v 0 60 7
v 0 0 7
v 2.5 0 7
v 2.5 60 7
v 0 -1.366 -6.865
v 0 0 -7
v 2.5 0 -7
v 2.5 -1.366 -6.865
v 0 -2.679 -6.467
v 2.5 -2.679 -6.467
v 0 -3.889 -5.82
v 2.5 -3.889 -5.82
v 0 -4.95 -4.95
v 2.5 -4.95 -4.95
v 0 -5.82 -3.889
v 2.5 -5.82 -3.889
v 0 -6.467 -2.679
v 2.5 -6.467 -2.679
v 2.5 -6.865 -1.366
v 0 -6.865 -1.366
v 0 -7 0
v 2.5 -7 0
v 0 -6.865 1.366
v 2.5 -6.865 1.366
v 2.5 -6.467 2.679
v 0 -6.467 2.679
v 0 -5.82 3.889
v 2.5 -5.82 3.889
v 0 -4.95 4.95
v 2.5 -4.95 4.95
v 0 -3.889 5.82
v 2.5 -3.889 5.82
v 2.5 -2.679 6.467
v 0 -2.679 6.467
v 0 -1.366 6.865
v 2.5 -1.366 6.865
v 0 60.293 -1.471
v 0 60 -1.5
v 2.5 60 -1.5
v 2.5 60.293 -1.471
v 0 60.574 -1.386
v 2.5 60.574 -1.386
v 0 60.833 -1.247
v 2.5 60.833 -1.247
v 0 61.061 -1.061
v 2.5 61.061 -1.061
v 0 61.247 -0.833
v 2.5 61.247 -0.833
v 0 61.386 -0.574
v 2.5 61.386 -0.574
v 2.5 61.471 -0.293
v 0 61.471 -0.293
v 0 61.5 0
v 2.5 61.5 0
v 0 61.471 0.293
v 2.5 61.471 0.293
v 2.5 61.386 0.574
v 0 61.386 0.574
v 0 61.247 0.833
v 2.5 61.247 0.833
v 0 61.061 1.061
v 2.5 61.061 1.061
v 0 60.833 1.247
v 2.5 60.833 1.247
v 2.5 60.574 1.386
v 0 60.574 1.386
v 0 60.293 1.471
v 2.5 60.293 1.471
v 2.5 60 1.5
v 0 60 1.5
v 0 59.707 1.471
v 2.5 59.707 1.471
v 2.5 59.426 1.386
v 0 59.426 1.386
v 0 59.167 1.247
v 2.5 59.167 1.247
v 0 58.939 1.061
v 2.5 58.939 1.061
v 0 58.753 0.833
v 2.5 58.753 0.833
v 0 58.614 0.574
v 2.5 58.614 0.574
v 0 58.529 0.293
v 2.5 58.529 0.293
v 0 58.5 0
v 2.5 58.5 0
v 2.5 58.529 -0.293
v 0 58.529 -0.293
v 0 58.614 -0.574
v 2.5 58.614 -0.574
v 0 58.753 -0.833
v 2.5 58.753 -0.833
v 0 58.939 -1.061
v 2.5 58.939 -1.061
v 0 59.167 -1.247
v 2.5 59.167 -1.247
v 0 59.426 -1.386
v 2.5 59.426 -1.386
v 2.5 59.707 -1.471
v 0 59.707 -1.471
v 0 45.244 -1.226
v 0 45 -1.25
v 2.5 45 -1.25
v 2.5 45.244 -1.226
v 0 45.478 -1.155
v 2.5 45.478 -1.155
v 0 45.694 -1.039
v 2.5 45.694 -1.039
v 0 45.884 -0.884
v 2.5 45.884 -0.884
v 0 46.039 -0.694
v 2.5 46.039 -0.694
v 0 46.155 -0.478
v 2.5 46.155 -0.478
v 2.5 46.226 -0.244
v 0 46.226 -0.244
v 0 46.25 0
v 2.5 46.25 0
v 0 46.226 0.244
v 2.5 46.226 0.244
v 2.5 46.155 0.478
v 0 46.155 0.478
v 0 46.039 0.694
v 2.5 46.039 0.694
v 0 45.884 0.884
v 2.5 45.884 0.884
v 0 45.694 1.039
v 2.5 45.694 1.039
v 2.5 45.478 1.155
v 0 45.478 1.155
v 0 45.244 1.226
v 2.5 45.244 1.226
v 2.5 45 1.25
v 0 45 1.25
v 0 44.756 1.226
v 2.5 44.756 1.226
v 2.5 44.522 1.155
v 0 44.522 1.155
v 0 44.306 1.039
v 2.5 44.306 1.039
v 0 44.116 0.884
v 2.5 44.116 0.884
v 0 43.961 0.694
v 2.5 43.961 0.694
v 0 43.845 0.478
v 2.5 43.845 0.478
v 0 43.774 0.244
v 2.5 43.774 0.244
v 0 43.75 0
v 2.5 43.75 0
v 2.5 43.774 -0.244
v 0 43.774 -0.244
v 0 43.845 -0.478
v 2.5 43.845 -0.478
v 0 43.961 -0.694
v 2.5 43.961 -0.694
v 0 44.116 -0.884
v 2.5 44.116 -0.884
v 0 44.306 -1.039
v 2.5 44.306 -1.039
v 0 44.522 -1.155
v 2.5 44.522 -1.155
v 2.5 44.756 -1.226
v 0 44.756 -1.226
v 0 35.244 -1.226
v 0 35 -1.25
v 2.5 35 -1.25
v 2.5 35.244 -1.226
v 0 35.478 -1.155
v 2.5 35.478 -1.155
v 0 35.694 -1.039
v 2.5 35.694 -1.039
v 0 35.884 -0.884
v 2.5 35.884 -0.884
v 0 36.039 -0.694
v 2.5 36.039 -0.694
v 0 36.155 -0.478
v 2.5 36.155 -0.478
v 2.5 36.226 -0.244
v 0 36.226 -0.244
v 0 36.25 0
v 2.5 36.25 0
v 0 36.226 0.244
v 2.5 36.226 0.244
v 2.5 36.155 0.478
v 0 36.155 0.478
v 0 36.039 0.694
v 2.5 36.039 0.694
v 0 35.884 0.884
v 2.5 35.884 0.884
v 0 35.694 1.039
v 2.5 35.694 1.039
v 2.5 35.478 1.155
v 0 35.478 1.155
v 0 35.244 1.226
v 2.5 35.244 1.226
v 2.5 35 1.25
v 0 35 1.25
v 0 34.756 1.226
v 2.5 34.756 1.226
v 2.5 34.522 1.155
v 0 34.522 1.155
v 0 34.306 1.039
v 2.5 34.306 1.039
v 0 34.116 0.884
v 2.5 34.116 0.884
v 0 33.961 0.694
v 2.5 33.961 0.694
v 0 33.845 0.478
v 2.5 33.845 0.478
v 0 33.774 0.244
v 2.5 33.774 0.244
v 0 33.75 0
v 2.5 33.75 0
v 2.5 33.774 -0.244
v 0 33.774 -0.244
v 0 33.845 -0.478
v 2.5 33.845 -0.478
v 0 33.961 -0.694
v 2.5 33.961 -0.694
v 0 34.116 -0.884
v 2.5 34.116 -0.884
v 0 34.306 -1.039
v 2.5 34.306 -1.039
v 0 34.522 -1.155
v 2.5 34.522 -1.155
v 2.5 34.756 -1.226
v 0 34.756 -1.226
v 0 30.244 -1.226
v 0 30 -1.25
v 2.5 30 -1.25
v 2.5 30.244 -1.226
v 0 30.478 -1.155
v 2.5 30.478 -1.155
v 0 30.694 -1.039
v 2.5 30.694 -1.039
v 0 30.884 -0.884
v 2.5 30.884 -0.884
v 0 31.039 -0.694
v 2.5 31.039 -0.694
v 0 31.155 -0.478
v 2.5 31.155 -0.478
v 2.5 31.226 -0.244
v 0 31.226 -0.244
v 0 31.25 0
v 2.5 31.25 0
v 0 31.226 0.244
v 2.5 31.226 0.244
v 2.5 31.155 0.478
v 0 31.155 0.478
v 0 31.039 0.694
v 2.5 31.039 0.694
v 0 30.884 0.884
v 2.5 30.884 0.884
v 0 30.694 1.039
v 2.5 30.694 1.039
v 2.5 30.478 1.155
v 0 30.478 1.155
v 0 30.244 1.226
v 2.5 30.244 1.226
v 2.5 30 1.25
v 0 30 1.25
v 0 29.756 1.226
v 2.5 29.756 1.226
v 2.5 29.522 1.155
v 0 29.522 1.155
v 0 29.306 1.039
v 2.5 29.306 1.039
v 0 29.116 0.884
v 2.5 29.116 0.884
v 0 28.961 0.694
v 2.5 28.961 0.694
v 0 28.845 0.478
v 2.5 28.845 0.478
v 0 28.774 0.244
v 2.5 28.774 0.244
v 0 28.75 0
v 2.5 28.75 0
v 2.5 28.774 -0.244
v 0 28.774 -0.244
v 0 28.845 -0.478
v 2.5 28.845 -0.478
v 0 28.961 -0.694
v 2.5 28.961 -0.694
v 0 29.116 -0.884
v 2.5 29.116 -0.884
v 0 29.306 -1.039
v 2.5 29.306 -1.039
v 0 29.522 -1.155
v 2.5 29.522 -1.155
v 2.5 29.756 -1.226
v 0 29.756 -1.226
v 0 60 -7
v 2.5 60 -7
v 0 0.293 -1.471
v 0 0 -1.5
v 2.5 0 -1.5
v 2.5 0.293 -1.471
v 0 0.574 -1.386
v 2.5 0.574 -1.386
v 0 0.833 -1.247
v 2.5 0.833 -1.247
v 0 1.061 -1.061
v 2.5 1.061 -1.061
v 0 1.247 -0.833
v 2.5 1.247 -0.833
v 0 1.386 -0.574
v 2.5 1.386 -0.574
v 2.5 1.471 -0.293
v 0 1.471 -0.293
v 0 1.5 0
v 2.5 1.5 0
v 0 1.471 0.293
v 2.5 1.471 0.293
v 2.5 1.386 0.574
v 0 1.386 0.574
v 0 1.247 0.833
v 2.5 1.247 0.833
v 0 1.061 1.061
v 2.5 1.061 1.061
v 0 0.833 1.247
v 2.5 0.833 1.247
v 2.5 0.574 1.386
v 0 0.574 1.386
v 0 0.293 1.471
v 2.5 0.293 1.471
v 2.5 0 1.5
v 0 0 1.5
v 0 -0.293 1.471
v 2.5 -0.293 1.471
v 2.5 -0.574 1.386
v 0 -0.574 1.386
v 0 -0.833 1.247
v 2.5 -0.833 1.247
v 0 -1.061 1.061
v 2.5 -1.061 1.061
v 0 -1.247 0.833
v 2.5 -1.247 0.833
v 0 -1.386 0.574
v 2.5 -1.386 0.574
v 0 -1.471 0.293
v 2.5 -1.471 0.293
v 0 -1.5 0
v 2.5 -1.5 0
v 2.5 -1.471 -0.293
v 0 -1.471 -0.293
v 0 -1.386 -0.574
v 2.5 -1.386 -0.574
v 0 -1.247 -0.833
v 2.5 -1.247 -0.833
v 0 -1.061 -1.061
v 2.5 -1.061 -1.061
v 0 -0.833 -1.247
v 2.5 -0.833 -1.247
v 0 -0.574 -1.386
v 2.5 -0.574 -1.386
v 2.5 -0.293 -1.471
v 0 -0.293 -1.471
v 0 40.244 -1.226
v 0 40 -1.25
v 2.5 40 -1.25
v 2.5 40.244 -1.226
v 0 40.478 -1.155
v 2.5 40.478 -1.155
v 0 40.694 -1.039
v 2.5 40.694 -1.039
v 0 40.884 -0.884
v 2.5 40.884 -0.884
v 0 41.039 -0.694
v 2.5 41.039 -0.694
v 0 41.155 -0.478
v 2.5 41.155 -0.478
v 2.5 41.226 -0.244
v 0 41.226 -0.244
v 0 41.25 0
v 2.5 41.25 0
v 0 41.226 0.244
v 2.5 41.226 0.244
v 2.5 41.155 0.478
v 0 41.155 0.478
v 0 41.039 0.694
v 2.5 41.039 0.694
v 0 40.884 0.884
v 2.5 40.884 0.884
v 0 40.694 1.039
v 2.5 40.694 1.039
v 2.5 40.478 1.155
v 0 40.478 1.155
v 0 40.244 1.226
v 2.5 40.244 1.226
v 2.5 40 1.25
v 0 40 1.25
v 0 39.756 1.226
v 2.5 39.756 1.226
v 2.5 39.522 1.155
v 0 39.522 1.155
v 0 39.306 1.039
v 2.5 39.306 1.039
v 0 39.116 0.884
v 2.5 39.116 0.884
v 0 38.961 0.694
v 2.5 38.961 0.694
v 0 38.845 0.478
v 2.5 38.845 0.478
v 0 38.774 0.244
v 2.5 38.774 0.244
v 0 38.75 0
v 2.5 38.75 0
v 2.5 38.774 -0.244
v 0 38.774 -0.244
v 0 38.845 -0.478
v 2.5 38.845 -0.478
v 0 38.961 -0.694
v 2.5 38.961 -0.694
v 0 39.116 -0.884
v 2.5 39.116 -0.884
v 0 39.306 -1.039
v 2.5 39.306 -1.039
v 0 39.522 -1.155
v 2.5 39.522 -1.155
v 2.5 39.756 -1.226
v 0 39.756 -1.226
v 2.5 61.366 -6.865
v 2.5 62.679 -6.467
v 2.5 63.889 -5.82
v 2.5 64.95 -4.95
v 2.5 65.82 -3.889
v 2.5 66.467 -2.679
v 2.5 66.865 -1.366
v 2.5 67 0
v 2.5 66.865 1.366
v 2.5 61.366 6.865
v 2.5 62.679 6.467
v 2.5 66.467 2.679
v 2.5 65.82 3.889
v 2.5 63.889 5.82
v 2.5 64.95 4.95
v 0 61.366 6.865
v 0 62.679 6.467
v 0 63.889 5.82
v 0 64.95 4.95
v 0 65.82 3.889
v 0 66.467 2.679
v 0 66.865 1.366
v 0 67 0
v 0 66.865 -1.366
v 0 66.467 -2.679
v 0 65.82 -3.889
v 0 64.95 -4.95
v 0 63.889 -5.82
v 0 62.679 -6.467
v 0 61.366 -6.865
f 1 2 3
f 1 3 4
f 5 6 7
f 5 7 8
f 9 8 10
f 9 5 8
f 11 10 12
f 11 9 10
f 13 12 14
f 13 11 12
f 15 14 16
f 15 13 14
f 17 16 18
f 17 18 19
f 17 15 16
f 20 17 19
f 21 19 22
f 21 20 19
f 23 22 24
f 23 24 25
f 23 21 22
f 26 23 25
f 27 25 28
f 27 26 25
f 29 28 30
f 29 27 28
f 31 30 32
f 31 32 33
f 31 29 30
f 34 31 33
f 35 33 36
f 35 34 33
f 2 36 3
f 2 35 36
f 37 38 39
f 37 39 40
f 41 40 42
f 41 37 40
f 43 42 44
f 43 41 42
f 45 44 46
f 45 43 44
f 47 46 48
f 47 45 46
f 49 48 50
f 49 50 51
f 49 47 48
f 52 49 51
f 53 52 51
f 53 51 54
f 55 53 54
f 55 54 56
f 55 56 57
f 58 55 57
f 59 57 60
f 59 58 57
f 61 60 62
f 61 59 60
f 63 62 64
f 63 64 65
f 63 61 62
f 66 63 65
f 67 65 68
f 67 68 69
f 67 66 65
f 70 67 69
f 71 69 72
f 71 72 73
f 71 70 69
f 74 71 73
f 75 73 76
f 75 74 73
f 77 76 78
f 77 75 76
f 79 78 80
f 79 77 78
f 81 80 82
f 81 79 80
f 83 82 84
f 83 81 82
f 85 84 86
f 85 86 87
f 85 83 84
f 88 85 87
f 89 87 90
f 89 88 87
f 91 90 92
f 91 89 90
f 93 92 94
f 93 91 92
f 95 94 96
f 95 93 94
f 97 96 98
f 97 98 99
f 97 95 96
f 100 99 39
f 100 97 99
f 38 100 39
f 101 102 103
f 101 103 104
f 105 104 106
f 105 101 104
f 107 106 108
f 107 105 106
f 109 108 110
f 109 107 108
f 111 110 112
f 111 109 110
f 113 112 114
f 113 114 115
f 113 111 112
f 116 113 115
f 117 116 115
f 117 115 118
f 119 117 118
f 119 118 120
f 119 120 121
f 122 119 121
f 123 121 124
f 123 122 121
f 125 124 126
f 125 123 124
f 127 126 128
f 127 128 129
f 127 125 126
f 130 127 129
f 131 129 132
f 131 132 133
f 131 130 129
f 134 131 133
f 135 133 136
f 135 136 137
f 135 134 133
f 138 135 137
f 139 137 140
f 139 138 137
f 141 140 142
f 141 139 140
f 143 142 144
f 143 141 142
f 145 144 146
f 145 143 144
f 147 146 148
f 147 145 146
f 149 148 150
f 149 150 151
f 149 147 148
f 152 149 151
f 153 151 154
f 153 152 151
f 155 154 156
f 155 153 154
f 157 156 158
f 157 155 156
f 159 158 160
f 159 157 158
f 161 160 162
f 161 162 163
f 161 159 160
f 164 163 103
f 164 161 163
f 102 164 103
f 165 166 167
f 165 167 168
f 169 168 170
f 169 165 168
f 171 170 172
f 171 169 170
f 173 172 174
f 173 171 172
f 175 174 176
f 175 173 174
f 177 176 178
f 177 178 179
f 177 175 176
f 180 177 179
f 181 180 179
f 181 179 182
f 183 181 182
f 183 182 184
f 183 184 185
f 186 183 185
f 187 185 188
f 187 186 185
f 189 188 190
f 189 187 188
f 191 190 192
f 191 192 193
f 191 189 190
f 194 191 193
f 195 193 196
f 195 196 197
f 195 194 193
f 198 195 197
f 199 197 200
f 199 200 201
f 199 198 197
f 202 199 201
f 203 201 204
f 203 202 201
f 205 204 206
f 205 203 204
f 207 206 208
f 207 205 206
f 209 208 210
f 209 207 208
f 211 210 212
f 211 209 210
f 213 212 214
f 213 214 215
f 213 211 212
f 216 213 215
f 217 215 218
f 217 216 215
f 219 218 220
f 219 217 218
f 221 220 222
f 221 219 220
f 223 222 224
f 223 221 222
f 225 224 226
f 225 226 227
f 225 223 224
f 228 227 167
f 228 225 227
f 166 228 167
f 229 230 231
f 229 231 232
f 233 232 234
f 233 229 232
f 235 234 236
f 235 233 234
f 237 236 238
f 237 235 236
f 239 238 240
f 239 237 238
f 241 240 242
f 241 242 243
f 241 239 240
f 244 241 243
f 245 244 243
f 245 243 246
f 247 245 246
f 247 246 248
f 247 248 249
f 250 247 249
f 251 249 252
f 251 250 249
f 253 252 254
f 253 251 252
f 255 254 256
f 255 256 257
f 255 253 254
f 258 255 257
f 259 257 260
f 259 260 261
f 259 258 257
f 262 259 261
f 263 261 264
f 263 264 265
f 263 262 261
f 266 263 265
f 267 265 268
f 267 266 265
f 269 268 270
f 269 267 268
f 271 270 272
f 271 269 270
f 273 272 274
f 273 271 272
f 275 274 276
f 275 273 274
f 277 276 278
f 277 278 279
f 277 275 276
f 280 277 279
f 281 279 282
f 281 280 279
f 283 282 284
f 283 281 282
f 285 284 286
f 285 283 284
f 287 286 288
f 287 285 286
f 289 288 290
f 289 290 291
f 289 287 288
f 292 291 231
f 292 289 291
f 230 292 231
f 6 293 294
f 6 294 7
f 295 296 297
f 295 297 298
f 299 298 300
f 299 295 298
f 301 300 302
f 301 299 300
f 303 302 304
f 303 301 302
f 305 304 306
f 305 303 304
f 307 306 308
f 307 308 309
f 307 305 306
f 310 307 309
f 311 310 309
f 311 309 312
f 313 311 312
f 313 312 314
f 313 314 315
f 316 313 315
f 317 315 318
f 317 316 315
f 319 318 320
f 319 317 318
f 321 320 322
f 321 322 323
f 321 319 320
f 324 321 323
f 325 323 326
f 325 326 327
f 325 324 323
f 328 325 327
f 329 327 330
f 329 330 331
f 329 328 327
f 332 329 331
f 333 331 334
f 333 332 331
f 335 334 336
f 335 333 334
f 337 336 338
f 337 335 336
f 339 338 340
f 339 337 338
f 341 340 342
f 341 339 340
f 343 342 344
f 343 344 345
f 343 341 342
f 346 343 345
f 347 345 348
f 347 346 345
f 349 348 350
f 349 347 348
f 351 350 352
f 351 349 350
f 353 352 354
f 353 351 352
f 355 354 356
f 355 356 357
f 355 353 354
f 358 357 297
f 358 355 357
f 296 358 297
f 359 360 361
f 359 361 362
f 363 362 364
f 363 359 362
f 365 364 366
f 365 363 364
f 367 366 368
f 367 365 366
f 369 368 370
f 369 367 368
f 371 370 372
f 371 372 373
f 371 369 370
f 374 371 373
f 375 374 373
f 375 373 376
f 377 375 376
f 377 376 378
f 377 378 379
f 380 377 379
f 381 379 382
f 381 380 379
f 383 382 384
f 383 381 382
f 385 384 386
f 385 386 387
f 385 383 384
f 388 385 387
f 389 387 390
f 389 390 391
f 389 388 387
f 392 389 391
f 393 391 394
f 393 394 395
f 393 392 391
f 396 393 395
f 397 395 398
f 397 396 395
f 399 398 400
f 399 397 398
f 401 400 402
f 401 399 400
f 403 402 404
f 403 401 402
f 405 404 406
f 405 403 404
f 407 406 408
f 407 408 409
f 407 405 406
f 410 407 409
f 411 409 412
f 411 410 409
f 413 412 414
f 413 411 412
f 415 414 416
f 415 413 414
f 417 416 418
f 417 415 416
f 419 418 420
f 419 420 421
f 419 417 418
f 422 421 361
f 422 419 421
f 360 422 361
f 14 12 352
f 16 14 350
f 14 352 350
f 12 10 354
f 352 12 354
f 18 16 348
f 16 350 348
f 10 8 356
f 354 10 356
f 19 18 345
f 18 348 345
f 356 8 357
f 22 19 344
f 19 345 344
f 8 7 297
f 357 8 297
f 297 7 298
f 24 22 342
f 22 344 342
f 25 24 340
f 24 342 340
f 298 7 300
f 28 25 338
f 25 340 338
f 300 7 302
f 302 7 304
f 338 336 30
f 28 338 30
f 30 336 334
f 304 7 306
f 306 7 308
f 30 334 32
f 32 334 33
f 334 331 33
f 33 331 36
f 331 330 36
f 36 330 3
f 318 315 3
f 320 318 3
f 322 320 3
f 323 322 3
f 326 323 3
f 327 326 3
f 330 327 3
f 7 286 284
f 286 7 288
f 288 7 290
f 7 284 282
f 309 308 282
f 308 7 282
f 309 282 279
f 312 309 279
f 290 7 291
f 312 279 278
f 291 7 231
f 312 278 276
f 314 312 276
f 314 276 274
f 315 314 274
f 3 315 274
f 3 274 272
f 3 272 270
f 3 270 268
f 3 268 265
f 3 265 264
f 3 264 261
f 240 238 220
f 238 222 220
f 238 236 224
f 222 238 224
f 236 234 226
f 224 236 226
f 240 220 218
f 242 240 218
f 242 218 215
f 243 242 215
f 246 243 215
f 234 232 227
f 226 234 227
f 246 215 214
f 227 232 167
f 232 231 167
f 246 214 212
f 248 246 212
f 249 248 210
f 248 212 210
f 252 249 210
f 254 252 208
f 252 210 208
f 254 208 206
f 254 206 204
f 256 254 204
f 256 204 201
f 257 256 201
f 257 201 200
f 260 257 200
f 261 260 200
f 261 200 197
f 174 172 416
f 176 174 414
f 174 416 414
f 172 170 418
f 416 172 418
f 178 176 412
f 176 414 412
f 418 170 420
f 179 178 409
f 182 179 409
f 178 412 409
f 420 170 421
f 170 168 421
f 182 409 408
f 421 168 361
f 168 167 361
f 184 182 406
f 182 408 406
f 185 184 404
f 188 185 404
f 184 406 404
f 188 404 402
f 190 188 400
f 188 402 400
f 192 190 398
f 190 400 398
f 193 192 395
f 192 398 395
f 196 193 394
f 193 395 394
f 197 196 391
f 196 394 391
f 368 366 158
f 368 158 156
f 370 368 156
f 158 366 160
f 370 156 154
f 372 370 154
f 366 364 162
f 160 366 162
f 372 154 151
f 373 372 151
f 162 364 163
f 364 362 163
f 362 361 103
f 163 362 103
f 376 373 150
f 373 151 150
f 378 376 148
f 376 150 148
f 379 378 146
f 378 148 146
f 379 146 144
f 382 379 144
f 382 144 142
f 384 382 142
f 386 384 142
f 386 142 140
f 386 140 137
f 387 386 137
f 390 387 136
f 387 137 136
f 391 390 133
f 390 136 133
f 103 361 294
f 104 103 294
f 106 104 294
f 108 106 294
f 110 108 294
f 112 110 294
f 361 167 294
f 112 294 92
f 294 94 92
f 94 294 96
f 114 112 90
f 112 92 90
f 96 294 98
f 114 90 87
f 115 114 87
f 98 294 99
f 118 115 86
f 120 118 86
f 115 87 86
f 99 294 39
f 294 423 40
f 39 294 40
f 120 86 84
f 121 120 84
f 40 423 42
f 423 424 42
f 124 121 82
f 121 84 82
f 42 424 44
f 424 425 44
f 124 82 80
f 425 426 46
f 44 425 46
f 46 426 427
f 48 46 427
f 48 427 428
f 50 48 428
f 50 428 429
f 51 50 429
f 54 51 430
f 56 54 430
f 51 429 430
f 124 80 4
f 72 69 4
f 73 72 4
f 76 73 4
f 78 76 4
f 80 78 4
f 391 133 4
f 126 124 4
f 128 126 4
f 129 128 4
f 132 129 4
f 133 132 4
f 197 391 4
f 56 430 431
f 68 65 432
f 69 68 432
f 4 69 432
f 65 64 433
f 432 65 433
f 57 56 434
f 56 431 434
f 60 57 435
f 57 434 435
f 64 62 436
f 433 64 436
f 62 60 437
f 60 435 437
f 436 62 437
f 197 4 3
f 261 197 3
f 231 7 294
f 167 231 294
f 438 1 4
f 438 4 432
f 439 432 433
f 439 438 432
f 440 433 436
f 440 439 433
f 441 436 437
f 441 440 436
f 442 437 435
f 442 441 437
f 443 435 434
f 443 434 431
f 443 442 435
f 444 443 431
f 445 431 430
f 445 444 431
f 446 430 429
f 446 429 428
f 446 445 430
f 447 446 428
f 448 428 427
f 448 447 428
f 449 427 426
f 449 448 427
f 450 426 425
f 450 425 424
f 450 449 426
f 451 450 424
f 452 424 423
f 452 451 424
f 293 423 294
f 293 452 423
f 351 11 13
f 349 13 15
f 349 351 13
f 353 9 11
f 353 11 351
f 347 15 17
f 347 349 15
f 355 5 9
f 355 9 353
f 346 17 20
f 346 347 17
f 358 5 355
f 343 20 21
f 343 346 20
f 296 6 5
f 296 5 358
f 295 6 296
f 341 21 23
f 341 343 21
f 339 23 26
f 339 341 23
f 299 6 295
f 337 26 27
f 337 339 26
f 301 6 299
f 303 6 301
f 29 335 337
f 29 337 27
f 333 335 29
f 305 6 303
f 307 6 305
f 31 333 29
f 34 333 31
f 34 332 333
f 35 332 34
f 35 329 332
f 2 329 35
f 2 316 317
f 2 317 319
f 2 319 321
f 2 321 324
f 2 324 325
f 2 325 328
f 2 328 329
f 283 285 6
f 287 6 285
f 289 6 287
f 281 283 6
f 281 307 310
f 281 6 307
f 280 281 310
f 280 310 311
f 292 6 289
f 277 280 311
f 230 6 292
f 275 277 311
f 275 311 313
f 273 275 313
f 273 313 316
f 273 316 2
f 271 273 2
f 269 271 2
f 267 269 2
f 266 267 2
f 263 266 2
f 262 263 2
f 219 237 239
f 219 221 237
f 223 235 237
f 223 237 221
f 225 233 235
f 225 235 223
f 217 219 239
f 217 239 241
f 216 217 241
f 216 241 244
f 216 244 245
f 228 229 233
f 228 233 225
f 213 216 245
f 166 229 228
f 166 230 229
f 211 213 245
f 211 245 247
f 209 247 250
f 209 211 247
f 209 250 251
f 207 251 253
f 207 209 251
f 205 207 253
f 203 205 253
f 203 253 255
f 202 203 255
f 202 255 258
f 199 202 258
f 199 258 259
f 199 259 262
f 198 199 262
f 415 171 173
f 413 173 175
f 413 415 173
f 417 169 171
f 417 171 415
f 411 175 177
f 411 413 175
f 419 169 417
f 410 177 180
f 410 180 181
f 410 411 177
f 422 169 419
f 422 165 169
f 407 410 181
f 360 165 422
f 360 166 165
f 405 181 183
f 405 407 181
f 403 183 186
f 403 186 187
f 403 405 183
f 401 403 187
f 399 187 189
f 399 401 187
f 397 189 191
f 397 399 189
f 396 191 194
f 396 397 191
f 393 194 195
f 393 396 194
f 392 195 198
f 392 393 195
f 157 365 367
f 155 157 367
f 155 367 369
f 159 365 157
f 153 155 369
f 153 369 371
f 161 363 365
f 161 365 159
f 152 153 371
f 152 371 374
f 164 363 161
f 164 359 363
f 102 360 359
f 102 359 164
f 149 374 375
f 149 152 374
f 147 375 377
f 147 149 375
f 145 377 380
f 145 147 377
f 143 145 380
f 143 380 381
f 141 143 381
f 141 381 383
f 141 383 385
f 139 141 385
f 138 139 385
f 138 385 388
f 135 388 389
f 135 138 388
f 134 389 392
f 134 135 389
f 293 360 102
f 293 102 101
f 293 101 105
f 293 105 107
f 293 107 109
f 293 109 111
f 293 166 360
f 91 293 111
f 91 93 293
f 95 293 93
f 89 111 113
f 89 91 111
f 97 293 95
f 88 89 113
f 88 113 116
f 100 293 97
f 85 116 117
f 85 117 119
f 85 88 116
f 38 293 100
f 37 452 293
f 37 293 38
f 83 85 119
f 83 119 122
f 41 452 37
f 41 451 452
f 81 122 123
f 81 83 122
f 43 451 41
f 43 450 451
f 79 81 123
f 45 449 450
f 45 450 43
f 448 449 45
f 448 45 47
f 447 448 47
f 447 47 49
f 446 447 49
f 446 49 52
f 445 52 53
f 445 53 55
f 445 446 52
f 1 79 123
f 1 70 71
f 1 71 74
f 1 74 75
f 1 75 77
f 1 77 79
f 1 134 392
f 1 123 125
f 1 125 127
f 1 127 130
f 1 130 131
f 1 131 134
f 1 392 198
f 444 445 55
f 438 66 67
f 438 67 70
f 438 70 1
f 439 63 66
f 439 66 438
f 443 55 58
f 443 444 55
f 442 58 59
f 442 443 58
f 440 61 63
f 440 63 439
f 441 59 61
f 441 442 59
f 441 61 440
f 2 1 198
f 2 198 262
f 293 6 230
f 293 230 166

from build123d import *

# Parameters (mm, degrees)
SKETCH1_R           = 1.5
SKETCH1_R_2         = 1.25
BOSS_EXTRUDE1_DEPTH = 2.5


with BuildPart() as part:
    # Sketch1 → Boss-Extrude1 (new body)
    with BuildSketch(Plane(origin=(0, 0, 0), x_dir=(0, 0, -1), z_dir=(1, 0, 0))):
        with BuildLine():
            Line((-7, 0), (-7, 60))
            ThreePointArc((-7, 60), (0, 67), (7, 60))
            Line((7, 60), (7, 0))
            ThreePointArc((7, 0), (0, -7), (-7, 0))
        make_face()
        Circle(SKETCH1_R, mode=Mode.SUBTRACT)
        with Locations((0, 60)):
            Circle(SKETCH1_R, mode=Mode.SUBTRACT)
        with Locations((0, 45)):
            Circle(SKETCH1_R_2, mode=Mode.SUBTRACT)
        with Locations((0, 40)):
            Circle(SKETCH1_R_2, mode=Mode.SUBTRACT)
        with Locations((0, 35)):
            Circle(SKETCH1_R_2, mode=Mode.SUBTRACT)
        with Locations((0, 30)):
            Circle(SKETCH1_R_2, mode=Mode.SUBTRACT)
    extrude(amount=BOSS_EXTRUDE1_DEPTH)


solid = part.part
